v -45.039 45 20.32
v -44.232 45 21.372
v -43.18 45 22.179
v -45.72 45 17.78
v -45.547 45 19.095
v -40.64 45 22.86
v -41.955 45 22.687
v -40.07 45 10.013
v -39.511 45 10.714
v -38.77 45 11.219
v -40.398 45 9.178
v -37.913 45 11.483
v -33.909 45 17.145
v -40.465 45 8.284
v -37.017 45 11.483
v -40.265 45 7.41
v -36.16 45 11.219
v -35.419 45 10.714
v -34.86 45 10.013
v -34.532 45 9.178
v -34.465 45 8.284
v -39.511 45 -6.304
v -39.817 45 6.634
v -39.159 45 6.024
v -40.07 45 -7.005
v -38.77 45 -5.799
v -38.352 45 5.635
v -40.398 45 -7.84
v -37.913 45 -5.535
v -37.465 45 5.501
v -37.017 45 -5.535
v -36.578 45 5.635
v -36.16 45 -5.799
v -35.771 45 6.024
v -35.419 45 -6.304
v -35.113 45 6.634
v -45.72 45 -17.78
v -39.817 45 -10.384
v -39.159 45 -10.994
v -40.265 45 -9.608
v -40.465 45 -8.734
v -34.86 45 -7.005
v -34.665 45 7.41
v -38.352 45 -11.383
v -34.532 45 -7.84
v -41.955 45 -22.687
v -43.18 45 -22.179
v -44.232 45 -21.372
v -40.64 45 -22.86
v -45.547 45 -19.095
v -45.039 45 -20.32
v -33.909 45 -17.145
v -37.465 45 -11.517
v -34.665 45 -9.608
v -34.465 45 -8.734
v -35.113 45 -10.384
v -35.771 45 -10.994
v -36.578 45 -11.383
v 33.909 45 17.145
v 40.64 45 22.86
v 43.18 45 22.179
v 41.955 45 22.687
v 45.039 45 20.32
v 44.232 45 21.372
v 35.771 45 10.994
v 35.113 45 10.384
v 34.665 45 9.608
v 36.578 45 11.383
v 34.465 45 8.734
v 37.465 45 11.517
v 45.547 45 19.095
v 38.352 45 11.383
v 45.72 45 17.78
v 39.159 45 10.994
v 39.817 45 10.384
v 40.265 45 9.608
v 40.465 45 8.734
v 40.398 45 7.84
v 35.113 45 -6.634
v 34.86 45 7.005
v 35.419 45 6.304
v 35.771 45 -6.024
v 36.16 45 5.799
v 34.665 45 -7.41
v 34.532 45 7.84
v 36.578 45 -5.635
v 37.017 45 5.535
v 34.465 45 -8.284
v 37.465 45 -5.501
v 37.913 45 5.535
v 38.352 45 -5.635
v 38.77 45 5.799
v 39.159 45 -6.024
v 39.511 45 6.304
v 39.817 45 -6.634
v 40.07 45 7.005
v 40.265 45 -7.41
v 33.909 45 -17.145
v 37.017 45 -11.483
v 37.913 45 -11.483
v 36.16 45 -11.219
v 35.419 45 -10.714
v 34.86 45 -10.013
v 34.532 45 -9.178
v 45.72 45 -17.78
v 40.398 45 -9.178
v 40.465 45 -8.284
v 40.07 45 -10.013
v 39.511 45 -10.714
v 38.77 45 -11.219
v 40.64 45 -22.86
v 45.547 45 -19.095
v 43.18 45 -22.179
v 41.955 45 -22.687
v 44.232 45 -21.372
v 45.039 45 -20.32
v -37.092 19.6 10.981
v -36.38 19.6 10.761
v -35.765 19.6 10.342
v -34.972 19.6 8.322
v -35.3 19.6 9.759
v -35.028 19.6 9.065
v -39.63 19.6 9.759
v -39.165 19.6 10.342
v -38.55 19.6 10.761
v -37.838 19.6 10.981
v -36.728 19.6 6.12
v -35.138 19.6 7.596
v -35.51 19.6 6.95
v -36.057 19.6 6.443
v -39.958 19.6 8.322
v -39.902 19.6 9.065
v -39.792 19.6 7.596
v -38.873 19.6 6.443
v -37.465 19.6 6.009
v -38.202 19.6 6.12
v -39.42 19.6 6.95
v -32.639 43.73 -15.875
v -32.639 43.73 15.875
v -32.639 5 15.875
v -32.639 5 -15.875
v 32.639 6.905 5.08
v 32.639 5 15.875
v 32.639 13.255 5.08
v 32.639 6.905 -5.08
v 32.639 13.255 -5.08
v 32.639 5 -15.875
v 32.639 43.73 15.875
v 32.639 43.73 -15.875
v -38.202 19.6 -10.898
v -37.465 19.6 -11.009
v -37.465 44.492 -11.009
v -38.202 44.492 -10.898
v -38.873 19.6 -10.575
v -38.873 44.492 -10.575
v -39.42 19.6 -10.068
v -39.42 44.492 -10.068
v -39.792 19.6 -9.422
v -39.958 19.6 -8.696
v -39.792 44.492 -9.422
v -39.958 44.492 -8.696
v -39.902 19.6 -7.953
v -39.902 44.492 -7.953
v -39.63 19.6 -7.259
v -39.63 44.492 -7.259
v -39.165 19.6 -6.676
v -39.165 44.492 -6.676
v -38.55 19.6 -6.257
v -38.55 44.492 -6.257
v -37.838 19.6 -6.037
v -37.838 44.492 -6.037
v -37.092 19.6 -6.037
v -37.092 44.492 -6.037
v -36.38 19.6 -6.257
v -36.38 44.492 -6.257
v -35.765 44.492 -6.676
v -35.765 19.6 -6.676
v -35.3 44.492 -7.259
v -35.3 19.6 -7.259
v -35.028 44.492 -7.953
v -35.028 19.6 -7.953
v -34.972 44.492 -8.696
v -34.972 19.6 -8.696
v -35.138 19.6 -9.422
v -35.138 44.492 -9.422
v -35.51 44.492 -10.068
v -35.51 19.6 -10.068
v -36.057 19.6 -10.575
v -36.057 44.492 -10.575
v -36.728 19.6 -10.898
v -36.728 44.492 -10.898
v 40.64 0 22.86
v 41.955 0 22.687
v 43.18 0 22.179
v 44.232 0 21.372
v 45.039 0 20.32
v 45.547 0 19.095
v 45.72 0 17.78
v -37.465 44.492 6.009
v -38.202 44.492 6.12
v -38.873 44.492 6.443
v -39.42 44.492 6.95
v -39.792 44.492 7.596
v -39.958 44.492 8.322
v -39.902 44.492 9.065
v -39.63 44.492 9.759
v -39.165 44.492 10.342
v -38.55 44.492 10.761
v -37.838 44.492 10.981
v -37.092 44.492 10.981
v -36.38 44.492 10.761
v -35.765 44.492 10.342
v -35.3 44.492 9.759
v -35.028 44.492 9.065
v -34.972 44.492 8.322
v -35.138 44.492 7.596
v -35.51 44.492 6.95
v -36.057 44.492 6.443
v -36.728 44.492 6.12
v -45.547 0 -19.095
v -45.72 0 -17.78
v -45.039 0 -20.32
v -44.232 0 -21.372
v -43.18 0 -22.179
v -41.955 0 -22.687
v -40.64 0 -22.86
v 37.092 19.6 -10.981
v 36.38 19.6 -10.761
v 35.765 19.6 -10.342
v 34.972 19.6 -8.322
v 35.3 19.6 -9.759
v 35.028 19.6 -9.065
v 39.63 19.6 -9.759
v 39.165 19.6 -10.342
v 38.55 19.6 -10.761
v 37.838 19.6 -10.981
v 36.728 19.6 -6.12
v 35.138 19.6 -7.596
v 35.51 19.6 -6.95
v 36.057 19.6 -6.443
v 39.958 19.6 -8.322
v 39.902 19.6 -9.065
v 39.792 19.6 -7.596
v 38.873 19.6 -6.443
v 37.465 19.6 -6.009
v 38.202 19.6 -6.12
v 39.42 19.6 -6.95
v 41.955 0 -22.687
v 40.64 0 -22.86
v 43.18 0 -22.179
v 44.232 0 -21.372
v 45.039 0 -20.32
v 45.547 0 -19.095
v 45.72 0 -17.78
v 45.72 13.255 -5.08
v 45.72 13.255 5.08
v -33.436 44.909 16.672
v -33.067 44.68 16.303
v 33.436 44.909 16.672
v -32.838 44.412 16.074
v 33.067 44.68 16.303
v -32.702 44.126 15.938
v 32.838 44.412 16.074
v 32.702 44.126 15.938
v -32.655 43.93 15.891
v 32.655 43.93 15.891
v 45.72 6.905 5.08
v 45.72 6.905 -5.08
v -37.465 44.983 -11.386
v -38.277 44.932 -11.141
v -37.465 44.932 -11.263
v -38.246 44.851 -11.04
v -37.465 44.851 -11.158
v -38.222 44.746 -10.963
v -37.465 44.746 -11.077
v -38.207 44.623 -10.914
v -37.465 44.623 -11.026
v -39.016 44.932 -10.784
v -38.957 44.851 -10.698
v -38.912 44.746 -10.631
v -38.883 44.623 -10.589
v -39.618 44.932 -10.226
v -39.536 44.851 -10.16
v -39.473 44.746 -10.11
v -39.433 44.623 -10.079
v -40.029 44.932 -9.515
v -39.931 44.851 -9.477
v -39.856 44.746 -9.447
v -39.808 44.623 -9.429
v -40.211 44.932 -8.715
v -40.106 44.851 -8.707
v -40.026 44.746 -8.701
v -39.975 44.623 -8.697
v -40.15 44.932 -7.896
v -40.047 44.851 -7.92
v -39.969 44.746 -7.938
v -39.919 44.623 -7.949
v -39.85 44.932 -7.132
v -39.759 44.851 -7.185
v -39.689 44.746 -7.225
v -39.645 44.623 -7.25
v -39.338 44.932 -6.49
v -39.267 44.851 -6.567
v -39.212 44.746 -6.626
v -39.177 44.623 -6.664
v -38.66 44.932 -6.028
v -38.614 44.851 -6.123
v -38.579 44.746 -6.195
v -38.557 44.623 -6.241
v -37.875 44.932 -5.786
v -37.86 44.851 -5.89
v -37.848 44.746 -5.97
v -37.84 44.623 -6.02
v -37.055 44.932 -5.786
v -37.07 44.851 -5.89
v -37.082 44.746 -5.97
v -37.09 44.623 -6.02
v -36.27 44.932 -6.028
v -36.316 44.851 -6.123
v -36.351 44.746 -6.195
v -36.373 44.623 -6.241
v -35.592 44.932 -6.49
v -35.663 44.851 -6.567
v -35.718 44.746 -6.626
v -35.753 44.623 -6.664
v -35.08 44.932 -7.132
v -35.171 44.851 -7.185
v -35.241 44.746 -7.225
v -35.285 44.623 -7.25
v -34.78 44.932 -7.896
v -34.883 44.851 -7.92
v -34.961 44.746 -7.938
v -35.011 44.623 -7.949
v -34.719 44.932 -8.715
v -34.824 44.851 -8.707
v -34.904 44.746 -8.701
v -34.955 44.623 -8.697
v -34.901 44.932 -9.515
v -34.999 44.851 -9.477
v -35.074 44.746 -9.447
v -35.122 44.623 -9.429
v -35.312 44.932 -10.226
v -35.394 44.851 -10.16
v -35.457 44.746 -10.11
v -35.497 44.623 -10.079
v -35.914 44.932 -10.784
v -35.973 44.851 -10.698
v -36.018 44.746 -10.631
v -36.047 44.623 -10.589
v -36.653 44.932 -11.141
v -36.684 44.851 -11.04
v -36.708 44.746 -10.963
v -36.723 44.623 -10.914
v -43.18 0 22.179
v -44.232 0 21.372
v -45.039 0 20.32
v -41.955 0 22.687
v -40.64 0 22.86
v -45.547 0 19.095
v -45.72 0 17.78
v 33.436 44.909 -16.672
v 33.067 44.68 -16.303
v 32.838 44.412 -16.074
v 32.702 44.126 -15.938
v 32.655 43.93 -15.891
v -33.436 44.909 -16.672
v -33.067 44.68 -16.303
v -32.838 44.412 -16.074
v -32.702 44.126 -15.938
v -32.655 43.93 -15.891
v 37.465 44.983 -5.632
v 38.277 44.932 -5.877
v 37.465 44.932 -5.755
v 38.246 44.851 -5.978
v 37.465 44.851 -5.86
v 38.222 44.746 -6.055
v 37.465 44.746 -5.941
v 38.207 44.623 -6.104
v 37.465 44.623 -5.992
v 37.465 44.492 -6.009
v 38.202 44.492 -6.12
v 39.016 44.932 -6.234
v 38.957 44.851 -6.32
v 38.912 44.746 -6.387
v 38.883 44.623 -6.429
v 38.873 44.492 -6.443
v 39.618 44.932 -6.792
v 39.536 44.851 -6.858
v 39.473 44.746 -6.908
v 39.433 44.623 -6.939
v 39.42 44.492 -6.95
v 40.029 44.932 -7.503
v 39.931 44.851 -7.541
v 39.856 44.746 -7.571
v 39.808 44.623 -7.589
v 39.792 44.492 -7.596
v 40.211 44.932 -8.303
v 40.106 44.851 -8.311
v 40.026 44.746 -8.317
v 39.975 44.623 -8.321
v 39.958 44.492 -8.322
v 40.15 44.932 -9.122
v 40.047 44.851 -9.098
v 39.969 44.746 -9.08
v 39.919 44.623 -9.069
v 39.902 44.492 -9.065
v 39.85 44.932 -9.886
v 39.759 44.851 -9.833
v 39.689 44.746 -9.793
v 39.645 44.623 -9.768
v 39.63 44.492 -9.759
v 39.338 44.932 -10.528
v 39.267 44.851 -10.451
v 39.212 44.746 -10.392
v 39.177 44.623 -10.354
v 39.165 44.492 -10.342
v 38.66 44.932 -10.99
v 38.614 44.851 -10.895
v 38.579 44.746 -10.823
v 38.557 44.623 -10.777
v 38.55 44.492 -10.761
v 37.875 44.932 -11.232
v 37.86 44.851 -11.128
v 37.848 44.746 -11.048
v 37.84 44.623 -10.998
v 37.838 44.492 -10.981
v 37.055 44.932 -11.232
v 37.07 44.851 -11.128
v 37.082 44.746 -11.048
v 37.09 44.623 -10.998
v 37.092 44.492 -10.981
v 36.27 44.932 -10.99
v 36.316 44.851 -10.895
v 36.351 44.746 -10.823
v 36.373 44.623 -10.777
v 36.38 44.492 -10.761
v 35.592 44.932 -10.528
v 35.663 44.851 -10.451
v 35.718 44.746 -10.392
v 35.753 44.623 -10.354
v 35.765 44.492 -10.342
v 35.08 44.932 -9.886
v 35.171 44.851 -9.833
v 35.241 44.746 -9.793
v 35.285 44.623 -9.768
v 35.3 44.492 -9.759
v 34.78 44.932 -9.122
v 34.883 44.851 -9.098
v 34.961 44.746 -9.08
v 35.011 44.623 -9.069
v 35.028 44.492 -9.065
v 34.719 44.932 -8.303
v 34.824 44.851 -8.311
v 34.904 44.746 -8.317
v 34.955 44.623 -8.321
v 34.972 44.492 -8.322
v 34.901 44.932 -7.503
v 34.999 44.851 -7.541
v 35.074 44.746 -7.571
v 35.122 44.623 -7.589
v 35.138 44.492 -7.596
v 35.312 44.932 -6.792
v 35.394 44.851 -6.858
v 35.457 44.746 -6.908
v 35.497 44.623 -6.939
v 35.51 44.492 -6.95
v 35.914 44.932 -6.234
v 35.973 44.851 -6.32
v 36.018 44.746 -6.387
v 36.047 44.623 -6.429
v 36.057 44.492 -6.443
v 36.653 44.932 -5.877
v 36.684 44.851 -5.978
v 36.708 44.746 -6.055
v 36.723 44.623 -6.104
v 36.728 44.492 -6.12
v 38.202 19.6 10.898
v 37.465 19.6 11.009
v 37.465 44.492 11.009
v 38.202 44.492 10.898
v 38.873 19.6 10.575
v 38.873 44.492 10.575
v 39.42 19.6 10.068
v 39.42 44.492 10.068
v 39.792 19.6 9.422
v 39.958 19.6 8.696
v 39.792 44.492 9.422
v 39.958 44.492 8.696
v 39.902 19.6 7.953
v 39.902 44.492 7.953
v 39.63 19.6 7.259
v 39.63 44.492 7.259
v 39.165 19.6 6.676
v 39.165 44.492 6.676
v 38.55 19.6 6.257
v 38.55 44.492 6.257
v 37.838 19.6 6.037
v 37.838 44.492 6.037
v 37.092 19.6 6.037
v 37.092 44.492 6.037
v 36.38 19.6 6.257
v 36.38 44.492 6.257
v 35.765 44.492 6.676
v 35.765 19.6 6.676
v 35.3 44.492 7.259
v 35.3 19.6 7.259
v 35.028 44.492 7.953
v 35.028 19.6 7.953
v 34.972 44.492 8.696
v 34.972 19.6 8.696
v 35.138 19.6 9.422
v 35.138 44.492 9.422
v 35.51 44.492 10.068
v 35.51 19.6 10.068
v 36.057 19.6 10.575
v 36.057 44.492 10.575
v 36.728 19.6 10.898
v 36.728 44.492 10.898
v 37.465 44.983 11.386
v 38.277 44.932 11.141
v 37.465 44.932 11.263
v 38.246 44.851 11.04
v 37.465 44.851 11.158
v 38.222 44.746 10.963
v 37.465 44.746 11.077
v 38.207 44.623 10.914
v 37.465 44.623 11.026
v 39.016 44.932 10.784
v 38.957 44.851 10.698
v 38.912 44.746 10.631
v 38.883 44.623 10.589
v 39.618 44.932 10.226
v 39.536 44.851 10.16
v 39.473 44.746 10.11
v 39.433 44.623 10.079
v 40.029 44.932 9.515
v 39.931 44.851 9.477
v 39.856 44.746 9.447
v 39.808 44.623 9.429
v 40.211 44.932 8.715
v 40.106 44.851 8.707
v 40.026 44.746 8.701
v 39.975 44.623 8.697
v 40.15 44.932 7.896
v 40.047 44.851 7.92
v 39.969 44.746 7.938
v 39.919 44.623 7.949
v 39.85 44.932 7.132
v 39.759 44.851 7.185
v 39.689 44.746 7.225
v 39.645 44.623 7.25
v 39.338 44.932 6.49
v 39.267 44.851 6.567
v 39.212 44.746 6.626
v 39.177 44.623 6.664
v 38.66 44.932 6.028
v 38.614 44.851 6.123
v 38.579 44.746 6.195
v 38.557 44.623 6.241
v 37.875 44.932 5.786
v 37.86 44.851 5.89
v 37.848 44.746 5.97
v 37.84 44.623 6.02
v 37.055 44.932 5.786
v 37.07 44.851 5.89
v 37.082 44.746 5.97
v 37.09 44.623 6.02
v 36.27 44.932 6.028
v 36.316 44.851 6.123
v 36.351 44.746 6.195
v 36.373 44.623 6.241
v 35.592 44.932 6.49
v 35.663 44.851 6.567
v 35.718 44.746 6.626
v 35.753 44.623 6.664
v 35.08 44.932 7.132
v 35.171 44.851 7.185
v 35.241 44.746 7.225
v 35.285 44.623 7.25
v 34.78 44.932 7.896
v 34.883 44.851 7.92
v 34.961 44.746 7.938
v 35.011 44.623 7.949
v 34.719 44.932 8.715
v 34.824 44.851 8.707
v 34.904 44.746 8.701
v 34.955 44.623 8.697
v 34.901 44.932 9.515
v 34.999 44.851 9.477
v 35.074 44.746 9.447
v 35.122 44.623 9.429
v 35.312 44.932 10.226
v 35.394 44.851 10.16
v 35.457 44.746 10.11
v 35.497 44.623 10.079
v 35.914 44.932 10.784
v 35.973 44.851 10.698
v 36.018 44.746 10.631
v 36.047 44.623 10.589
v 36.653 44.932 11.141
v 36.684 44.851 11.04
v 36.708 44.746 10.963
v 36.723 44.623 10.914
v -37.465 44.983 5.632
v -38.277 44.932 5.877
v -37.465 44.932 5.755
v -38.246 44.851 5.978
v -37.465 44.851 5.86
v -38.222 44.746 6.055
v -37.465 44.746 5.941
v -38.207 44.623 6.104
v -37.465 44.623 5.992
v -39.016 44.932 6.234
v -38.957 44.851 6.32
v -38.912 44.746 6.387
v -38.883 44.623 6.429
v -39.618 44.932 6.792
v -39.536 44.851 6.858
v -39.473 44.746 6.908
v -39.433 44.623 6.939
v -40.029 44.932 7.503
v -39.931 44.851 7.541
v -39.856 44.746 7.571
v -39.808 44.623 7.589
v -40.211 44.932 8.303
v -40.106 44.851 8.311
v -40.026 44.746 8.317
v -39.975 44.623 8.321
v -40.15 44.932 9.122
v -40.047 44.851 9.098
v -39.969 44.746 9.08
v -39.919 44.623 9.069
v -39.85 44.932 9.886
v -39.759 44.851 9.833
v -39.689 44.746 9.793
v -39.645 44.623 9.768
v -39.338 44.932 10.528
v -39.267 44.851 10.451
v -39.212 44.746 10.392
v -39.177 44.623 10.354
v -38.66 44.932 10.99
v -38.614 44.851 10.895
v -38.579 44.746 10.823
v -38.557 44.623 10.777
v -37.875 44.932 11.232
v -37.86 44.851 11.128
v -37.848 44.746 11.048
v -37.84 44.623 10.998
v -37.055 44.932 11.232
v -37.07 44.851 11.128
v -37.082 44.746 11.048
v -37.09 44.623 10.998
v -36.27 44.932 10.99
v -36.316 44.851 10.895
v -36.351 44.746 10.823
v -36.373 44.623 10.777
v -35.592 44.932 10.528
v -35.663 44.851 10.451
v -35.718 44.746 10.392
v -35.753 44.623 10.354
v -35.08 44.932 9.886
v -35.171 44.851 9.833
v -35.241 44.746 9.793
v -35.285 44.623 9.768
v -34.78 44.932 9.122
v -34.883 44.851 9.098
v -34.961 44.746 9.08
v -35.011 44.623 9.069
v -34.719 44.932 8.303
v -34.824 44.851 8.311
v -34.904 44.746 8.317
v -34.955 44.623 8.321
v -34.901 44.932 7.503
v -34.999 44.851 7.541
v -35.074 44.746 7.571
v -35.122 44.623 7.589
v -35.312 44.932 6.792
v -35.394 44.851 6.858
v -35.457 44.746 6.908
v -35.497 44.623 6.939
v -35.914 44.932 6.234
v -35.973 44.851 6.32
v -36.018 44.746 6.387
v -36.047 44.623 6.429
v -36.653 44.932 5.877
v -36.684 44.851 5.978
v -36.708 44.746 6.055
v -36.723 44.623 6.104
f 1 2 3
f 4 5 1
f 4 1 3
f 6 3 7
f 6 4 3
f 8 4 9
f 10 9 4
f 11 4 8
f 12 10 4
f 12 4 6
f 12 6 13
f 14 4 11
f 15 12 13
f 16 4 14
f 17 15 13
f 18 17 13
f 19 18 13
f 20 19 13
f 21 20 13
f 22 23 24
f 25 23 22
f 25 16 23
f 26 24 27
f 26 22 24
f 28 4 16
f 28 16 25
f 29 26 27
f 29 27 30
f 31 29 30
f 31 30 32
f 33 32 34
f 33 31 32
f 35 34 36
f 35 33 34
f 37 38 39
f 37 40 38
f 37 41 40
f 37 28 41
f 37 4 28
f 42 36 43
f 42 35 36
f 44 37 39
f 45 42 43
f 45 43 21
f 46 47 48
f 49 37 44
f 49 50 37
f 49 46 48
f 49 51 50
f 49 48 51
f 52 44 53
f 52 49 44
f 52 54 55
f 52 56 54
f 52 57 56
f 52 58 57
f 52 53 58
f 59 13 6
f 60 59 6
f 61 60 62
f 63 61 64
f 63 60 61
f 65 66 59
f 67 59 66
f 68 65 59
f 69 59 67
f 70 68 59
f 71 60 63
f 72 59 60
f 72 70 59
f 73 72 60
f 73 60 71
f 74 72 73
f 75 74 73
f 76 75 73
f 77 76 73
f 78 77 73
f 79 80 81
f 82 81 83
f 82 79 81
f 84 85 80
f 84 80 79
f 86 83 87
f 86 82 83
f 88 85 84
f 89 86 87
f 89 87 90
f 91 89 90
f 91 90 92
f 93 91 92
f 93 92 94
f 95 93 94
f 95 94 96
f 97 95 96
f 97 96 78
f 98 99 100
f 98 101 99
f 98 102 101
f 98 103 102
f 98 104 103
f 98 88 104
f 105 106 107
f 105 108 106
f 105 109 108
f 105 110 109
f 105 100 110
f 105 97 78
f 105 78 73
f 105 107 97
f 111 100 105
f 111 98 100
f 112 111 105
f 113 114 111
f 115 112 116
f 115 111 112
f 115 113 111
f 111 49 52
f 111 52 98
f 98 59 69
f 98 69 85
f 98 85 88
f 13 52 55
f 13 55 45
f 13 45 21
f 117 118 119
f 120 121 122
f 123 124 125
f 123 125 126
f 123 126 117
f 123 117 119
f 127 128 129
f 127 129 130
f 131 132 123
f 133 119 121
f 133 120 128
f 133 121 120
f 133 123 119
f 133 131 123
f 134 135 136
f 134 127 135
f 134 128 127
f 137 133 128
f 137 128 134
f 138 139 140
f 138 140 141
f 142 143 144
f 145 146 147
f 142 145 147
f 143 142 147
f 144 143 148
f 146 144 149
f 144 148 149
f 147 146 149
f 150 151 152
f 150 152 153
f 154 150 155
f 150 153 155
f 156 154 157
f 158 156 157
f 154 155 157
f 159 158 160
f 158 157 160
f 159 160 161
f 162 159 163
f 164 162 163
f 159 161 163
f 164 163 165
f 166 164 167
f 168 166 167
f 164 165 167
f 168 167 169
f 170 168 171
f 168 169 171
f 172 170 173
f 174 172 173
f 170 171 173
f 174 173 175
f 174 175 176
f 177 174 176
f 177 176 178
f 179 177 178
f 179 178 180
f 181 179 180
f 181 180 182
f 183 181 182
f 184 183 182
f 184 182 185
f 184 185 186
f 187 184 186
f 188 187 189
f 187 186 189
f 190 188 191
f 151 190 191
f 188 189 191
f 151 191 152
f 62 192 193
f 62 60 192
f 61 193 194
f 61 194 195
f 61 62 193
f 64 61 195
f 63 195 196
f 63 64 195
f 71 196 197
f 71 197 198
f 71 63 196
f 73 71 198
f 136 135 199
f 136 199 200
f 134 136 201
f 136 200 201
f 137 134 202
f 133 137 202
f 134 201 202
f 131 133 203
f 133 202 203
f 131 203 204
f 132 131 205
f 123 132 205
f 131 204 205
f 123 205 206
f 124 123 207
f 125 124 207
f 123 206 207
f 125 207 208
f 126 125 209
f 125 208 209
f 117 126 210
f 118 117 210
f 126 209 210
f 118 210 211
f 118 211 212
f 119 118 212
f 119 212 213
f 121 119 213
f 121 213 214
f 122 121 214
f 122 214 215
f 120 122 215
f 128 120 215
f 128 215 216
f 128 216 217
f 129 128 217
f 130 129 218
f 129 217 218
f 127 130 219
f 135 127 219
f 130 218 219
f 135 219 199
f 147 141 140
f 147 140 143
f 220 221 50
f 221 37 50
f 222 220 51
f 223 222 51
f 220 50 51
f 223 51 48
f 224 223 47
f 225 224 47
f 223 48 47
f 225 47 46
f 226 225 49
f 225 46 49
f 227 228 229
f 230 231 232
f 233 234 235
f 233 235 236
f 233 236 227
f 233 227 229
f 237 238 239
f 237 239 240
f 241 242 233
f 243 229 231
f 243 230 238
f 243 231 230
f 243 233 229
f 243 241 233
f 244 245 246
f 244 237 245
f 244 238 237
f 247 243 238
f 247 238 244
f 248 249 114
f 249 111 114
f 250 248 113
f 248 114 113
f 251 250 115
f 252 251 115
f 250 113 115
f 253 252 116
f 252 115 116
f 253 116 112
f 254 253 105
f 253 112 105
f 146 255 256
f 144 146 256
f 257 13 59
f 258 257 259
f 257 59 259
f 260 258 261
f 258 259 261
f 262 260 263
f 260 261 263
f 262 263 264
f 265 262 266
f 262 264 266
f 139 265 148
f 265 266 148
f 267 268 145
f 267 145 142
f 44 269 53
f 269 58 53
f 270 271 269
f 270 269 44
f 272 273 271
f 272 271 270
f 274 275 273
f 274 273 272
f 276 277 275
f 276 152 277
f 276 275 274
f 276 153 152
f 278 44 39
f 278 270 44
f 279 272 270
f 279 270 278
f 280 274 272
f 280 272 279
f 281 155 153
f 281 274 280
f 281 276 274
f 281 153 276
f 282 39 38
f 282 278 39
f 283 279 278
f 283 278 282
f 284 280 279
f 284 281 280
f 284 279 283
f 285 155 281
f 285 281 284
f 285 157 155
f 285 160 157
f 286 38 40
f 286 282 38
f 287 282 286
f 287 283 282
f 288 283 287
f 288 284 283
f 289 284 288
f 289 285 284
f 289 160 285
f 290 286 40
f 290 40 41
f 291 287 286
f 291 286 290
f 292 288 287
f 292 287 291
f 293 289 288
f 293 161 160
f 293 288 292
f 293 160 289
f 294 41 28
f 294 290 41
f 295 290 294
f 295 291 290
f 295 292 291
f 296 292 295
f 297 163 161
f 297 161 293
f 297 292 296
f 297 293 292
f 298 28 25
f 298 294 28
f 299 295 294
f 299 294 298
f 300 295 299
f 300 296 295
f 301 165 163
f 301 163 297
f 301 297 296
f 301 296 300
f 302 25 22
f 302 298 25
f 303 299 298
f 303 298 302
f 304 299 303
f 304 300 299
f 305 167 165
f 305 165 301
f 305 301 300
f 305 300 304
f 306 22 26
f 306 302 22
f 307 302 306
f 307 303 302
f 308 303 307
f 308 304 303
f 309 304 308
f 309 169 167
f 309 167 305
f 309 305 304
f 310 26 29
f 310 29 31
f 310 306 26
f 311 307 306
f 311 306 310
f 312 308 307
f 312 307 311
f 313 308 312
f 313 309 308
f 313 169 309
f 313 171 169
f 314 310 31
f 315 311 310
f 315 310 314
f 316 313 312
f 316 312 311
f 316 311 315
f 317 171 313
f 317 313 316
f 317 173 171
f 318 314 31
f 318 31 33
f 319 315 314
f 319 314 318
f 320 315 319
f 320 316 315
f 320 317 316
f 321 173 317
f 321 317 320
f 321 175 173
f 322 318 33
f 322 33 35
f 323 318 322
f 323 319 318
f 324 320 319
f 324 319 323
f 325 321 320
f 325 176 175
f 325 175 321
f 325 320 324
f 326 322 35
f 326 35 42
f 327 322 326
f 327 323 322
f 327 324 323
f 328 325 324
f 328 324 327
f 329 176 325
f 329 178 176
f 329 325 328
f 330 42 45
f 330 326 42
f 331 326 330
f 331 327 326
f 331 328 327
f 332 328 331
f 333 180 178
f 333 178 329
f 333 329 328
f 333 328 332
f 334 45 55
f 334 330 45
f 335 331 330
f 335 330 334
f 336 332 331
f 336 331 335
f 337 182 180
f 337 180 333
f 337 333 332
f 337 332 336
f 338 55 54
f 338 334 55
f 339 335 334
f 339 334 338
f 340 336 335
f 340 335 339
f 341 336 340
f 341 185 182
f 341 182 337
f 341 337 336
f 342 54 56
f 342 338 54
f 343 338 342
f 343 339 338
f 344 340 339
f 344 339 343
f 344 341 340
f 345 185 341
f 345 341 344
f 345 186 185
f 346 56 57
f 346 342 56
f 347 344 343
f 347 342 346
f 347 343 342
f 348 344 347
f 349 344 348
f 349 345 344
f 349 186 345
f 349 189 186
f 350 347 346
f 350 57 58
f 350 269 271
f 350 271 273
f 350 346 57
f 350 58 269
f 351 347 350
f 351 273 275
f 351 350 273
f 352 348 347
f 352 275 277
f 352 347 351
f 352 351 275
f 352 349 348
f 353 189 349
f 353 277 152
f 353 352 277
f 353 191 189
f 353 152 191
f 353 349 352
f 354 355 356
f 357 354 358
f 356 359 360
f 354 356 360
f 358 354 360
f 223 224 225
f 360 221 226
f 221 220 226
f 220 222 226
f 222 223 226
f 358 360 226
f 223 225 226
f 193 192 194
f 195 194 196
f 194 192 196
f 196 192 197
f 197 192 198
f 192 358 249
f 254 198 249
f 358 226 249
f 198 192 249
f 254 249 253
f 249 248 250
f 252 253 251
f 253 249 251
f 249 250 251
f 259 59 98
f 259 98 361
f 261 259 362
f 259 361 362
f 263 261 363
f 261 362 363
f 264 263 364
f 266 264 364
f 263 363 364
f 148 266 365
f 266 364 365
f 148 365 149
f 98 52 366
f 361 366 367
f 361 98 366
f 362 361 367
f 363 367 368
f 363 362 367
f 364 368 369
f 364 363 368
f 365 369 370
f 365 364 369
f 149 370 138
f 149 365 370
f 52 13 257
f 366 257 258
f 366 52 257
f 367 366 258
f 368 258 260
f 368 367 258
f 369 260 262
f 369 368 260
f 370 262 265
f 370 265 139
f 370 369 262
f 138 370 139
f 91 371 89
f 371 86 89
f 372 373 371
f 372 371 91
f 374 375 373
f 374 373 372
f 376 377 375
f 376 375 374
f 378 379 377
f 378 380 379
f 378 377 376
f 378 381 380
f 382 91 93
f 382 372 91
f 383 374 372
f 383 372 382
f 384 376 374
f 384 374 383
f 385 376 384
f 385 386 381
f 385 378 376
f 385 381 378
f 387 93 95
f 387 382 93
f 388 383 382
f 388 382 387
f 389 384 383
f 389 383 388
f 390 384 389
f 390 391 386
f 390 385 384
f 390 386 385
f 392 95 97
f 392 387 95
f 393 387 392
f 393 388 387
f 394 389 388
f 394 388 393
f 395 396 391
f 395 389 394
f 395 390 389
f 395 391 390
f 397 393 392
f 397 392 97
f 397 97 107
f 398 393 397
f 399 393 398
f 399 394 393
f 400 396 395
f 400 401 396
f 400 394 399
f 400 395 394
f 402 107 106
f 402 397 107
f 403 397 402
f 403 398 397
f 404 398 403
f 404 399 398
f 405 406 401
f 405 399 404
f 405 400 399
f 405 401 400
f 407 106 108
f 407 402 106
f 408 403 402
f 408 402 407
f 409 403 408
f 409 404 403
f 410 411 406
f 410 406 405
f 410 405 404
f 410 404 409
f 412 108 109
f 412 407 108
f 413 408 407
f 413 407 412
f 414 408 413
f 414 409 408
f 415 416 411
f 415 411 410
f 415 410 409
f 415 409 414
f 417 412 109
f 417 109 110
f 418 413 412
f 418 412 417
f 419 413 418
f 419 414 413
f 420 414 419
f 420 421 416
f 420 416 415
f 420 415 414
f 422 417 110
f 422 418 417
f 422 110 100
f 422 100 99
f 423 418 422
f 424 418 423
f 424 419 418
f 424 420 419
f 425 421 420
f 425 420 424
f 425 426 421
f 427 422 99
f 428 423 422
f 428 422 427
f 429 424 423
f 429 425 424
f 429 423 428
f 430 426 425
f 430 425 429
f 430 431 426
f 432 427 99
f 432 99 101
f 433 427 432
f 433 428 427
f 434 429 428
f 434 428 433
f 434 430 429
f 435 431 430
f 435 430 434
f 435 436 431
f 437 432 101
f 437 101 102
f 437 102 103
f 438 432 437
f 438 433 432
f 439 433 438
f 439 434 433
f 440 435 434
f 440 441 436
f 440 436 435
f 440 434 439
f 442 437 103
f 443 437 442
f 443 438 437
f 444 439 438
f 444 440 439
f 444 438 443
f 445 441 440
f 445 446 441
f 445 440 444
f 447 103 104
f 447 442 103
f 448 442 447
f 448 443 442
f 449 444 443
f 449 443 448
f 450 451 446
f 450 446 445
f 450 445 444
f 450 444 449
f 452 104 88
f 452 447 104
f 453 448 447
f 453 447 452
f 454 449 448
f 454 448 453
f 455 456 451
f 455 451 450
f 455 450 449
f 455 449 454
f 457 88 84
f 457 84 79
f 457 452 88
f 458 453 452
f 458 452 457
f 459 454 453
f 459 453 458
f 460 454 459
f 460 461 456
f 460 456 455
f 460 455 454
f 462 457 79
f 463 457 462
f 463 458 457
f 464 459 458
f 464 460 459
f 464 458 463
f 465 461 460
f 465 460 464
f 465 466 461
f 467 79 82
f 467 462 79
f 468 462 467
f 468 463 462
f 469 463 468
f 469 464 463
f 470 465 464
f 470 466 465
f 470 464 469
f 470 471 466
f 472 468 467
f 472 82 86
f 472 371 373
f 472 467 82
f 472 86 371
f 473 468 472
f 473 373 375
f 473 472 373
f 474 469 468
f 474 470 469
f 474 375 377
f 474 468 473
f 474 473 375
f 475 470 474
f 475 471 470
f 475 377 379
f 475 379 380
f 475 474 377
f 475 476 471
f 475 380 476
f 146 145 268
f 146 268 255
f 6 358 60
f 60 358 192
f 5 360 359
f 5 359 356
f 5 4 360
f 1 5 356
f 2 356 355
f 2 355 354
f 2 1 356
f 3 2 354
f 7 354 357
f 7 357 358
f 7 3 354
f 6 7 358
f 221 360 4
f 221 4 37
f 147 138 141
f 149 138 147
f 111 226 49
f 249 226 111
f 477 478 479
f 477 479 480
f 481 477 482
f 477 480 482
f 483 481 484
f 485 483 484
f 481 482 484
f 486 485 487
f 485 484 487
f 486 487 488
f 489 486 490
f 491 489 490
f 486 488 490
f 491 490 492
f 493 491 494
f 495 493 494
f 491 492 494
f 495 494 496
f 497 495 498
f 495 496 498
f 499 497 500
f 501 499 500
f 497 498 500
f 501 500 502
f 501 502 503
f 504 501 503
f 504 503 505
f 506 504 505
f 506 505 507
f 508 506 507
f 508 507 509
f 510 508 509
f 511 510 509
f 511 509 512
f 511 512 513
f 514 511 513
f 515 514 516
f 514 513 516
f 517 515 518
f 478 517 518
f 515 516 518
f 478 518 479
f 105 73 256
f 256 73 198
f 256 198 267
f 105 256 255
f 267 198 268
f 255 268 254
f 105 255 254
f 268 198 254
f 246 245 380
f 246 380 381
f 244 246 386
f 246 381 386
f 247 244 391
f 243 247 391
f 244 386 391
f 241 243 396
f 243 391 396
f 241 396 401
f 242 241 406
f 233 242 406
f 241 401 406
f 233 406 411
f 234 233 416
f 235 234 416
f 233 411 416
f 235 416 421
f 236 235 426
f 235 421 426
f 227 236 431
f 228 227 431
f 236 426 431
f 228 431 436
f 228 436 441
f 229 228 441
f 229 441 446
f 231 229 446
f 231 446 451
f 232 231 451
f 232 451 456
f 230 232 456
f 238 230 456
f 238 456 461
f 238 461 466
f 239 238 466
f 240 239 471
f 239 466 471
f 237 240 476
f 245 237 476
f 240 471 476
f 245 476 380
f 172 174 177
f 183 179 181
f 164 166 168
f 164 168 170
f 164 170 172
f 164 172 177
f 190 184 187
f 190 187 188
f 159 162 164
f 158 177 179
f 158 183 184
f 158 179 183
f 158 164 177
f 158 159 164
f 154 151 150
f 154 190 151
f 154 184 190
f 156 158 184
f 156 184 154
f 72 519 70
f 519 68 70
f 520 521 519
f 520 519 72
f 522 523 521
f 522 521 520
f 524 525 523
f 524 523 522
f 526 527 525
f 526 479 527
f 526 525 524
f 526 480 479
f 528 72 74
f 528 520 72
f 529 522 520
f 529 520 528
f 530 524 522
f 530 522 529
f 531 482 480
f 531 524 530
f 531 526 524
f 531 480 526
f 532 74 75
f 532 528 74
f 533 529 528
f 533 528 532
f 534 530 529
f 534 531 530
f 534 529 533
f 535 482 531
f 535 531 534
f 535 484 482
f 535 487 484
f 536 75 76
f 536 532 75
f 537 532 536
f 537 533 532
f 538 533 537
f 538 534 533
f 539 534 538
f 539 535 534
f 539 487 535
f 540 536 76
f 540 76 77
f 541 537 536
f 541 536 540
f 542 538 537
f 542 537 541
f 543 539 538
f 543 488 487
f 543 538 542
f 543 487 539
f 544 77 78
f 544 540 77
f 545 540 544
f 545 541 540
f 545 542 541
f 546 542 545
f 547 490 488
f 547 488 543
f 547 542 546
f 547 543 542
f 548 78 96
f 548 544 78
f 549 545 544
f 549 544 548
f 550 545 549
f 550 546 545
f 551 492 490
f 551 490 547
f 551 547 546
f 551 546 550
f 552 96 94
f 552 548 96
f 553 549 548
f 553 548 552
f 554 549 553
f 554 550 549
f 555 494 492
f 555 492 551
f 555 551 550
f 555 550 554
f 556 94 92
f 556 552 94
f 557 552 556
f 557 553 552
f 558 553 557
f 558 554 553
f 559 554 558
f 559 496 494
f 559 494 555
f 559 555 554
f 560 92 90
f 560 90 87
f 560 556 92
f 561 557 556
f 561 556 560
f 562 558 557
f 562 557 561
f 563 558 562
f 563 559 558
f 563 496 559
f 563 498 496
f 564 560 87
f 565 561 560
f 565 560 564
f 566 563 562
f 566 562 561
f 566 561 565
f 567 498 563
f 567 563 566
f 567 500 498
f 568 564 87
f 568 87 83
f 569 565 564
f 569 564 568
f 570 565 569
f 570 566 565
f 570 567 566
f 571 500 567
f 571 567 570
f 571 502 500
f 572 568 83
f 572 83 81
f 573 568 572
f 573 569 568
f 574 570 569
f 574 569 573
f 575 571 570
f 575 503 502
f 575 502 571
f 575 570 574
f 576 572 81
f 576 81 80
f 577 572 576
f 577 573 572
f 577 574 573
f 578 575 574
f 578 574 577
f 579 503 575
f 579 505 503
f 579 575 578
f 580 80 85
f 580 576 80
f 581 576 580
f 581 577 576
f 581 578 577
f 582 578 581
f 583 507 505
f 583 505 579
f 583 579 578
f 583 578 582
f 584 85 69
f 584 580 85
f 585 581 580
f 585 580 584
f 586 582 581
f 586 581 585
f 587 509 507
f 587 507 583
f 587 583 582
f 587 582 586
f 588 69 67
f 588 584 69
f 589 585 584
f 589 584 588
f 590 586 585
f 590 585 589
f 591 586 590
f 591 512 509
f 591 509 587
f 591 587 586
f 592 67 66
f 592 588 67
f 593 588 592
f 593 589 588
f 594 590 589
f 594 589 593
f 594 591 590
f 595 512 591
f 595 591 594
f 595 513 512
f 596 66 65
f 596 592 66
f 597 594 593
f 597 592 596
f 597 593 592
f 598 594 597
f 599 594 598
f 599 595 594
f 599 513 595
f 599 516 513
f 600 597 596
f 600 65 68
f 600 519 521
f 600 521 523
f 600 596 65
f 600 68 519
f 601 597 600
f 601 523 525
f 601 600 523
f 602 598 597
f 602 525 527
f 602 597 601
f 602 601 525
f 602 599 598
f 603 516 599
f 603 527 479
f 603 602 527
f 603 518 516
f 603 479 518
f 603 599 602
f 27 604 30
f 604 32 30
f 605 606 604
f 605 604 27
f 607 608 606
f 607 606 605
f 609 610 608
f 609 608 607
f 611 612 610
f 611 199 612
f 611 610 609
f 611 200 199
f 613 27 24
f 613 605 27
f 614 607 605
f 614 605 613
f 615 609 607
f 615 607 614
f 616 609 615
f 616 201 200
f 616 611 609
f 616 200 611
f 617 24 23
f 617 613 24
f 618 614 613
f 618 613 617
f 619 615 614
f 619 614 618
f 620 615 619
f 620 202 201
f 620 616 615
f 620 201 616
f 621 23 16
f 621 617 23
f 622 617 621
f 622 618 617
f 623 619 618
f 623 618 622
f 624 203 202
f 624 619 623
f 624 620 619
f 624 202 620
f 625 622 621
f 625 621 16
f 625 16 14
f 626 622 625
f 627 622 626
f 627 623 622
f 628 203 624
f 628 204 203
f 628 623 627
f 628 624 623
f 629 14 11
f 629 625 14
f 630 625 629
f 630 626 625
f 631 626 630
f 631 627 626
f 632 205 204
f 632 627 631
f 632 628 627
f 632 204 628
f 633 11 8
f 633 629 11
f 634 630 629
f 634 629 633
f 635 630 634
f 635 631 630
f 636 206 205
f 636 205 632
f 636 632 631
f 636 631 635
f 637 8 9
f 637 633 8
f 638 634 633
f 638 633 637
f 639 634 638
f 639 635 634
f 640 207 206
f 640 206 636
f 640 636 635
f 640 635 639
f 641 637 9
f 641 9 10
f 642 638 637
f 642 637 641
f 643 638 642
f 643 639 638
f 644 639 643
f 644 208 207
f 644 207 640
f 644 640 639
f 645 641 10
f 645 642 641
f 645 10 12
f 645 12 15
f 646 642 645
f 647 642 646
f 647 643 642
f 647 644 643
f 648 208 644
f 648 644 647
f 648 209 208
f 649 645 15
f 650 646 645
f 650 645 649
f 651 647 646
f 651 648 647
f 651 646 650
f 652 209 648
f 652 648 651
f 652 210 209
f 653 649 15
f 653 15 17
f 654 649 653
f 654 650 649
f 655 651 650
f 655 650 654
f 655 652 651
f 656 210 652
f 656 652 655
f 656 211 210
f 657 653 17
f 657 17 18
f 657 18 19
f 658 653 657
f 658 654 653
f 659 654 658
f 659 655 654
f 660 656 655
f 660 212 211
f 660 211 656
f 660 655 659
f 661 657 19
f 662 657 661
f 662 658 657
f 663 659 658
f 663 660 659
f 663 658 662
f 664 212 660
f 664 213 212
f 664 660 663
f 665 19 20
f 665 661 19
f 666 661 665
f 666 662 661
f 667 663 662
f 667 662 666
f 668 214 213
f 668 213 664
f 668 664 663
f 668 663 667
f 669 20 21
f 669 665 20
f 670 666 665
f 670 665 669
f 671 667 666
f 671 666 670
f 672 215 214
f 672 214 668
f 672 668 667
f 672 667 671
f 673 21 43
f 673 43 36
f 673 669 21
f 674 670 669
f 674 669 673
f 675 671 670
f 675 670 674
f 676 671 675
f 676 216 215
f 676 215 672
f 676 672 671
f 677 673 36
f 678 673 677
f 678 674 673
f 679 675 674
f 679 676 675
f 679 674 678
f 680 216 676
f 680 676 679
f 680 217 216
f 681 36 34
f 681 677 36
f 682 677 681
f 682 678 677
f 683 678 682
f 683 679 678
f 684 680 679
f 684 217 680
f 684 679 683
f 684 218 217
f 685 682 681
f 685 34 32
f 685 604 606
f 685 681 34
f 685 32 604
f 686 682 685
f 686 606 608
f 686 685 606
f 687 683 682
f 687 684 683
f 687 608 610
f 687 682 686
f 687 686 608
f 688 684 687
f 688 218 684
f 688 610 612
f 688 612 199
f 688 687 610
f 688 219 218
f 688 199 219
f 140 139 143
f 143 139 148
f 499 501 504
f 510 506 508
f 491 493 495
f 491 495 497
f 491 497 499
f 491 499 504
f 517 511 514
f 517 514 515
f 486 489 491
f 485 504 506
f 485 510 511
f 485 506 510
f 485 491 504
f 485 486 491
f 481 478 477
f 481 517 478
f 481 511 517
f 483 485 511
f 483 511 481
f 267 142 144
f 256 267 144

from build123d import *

# Parameters (mm, degrees)
SKETCH1_W           = 91.44
SKETCH1_H           = 45.72
BOSS_EXTRUDE1_DEPTH = 45
SKETCH2_W           = 65.278
SKETCH2_H           = 31.75
CUT_EXTRUDE1_DEPTH  = 40
SKETCH3_R           = 2.5
CUT_EXTRUDE2_DEPTH  = 25.4
FILLET1_R           = 5.08
FILLET3_R           = 1.27
FILLET4_R           = 0.508
SKETCH4_W           = 10.16
SKETCH4_H           = 6.35
CUT_EXTRUDE3_DEPTH  = 94.207899241


with BuildPart() as part:
    # Sketch1 → Boss-Extrude1 (new body)
    with BuildSketch(Plane(origin=(0, 0, 0), x_dir=(1, 0, 0), z_dir=(0, 1, 0))):
        Rectangle(SKETCH1_W, SKETCH1_H)
    extrude(amount=BOSS_EXTRUDE1_DEPTH)

    # Sketch2 → Cut-Extrude1 (cut)
    with BuildSketch(Plane(origin=(0, 45, 0), x_dir=(1, 0, 0), z_dir=(0, 1, 0))):
        Rectangle(SKETCH2_W, SKETCH2_H)
    extrude(amount=-CUT_EXTRUDE1_DEPTH, mode=Mode.SUBTRACT)

    # Sketch3 → Cut-Extrude2 (cut)
    with BuildSketch(Plane(origin=(0, 45, 0), x_dir=(1, 0, 0), z_dir=(0, 1, 0))):
        with Locations(Location((37.465, 8.509, 0), (0, 0, 270))):
            Circle(SKETCH3_R)
        with Locations(Location((37.465, -8.509, 0), (0, 0, 270))):
            Circle(SKETCH3_R)
        with Locations(Location((-37.465, -8.509, 0), (0, 0, 90))):
            Circle(SKETCH3_R)
        with Locations(Location((-37.465, 8.509, 0), (0, 0, 90))):
            Circle(SKETCH3_R)
    extrude(amount=-CUT_EXTRUDE2_DEPTH, mode=Mode.SUBTRACT)

    # Fillet1
    fillet1_edges = [part.edges().sort_by_distance(p)[0] for p in [
        (45.72, 22.5, 22.86),
        (-45.72, 22.5, 22.86),
        (-45.72, 22.5, -22.86),
        (45.72, 22.5, -22.86),
    ]]
    fillet(fillet1_edges, radius=FILLET1_R)

    # Fillet3
    fillet3_edges = [part.edges().sort_by_distance(p)[0] for p in [
        (32.639, 45, 0),
        (0, 45, -15.875),
        (-32.639, 45, 0),
        (0, 45, 15.875),
    ]]
    fillet(fillet3_edges, radius=FILLET3_R)

    # Fillet4
    fillet4_edges = [part.edges().sort_by_distance(p)[0] for p in [
        (-37.465, 45, -6.009),
        (-37.465, 45, 11.009),
        (37.465, 45, 6.009),
        (37.465, 45, -11.009),
    ]]
    fillet(fillet4_edges, radius=FILLET4_R)

    # Sketch4 → Cut-Extrude3 (cut, through all)
    with BuildSketch(Plane.ZY.offset(-32.639)):
        with Locations((0, 10.08)):
            Rectangle(SKETCH4_W, SKETCH4_H)
    extrude(amount=-CUT_EXTRUDE3_DEPTH, mode=Mode.SUBTRACT)


solid = part.part
